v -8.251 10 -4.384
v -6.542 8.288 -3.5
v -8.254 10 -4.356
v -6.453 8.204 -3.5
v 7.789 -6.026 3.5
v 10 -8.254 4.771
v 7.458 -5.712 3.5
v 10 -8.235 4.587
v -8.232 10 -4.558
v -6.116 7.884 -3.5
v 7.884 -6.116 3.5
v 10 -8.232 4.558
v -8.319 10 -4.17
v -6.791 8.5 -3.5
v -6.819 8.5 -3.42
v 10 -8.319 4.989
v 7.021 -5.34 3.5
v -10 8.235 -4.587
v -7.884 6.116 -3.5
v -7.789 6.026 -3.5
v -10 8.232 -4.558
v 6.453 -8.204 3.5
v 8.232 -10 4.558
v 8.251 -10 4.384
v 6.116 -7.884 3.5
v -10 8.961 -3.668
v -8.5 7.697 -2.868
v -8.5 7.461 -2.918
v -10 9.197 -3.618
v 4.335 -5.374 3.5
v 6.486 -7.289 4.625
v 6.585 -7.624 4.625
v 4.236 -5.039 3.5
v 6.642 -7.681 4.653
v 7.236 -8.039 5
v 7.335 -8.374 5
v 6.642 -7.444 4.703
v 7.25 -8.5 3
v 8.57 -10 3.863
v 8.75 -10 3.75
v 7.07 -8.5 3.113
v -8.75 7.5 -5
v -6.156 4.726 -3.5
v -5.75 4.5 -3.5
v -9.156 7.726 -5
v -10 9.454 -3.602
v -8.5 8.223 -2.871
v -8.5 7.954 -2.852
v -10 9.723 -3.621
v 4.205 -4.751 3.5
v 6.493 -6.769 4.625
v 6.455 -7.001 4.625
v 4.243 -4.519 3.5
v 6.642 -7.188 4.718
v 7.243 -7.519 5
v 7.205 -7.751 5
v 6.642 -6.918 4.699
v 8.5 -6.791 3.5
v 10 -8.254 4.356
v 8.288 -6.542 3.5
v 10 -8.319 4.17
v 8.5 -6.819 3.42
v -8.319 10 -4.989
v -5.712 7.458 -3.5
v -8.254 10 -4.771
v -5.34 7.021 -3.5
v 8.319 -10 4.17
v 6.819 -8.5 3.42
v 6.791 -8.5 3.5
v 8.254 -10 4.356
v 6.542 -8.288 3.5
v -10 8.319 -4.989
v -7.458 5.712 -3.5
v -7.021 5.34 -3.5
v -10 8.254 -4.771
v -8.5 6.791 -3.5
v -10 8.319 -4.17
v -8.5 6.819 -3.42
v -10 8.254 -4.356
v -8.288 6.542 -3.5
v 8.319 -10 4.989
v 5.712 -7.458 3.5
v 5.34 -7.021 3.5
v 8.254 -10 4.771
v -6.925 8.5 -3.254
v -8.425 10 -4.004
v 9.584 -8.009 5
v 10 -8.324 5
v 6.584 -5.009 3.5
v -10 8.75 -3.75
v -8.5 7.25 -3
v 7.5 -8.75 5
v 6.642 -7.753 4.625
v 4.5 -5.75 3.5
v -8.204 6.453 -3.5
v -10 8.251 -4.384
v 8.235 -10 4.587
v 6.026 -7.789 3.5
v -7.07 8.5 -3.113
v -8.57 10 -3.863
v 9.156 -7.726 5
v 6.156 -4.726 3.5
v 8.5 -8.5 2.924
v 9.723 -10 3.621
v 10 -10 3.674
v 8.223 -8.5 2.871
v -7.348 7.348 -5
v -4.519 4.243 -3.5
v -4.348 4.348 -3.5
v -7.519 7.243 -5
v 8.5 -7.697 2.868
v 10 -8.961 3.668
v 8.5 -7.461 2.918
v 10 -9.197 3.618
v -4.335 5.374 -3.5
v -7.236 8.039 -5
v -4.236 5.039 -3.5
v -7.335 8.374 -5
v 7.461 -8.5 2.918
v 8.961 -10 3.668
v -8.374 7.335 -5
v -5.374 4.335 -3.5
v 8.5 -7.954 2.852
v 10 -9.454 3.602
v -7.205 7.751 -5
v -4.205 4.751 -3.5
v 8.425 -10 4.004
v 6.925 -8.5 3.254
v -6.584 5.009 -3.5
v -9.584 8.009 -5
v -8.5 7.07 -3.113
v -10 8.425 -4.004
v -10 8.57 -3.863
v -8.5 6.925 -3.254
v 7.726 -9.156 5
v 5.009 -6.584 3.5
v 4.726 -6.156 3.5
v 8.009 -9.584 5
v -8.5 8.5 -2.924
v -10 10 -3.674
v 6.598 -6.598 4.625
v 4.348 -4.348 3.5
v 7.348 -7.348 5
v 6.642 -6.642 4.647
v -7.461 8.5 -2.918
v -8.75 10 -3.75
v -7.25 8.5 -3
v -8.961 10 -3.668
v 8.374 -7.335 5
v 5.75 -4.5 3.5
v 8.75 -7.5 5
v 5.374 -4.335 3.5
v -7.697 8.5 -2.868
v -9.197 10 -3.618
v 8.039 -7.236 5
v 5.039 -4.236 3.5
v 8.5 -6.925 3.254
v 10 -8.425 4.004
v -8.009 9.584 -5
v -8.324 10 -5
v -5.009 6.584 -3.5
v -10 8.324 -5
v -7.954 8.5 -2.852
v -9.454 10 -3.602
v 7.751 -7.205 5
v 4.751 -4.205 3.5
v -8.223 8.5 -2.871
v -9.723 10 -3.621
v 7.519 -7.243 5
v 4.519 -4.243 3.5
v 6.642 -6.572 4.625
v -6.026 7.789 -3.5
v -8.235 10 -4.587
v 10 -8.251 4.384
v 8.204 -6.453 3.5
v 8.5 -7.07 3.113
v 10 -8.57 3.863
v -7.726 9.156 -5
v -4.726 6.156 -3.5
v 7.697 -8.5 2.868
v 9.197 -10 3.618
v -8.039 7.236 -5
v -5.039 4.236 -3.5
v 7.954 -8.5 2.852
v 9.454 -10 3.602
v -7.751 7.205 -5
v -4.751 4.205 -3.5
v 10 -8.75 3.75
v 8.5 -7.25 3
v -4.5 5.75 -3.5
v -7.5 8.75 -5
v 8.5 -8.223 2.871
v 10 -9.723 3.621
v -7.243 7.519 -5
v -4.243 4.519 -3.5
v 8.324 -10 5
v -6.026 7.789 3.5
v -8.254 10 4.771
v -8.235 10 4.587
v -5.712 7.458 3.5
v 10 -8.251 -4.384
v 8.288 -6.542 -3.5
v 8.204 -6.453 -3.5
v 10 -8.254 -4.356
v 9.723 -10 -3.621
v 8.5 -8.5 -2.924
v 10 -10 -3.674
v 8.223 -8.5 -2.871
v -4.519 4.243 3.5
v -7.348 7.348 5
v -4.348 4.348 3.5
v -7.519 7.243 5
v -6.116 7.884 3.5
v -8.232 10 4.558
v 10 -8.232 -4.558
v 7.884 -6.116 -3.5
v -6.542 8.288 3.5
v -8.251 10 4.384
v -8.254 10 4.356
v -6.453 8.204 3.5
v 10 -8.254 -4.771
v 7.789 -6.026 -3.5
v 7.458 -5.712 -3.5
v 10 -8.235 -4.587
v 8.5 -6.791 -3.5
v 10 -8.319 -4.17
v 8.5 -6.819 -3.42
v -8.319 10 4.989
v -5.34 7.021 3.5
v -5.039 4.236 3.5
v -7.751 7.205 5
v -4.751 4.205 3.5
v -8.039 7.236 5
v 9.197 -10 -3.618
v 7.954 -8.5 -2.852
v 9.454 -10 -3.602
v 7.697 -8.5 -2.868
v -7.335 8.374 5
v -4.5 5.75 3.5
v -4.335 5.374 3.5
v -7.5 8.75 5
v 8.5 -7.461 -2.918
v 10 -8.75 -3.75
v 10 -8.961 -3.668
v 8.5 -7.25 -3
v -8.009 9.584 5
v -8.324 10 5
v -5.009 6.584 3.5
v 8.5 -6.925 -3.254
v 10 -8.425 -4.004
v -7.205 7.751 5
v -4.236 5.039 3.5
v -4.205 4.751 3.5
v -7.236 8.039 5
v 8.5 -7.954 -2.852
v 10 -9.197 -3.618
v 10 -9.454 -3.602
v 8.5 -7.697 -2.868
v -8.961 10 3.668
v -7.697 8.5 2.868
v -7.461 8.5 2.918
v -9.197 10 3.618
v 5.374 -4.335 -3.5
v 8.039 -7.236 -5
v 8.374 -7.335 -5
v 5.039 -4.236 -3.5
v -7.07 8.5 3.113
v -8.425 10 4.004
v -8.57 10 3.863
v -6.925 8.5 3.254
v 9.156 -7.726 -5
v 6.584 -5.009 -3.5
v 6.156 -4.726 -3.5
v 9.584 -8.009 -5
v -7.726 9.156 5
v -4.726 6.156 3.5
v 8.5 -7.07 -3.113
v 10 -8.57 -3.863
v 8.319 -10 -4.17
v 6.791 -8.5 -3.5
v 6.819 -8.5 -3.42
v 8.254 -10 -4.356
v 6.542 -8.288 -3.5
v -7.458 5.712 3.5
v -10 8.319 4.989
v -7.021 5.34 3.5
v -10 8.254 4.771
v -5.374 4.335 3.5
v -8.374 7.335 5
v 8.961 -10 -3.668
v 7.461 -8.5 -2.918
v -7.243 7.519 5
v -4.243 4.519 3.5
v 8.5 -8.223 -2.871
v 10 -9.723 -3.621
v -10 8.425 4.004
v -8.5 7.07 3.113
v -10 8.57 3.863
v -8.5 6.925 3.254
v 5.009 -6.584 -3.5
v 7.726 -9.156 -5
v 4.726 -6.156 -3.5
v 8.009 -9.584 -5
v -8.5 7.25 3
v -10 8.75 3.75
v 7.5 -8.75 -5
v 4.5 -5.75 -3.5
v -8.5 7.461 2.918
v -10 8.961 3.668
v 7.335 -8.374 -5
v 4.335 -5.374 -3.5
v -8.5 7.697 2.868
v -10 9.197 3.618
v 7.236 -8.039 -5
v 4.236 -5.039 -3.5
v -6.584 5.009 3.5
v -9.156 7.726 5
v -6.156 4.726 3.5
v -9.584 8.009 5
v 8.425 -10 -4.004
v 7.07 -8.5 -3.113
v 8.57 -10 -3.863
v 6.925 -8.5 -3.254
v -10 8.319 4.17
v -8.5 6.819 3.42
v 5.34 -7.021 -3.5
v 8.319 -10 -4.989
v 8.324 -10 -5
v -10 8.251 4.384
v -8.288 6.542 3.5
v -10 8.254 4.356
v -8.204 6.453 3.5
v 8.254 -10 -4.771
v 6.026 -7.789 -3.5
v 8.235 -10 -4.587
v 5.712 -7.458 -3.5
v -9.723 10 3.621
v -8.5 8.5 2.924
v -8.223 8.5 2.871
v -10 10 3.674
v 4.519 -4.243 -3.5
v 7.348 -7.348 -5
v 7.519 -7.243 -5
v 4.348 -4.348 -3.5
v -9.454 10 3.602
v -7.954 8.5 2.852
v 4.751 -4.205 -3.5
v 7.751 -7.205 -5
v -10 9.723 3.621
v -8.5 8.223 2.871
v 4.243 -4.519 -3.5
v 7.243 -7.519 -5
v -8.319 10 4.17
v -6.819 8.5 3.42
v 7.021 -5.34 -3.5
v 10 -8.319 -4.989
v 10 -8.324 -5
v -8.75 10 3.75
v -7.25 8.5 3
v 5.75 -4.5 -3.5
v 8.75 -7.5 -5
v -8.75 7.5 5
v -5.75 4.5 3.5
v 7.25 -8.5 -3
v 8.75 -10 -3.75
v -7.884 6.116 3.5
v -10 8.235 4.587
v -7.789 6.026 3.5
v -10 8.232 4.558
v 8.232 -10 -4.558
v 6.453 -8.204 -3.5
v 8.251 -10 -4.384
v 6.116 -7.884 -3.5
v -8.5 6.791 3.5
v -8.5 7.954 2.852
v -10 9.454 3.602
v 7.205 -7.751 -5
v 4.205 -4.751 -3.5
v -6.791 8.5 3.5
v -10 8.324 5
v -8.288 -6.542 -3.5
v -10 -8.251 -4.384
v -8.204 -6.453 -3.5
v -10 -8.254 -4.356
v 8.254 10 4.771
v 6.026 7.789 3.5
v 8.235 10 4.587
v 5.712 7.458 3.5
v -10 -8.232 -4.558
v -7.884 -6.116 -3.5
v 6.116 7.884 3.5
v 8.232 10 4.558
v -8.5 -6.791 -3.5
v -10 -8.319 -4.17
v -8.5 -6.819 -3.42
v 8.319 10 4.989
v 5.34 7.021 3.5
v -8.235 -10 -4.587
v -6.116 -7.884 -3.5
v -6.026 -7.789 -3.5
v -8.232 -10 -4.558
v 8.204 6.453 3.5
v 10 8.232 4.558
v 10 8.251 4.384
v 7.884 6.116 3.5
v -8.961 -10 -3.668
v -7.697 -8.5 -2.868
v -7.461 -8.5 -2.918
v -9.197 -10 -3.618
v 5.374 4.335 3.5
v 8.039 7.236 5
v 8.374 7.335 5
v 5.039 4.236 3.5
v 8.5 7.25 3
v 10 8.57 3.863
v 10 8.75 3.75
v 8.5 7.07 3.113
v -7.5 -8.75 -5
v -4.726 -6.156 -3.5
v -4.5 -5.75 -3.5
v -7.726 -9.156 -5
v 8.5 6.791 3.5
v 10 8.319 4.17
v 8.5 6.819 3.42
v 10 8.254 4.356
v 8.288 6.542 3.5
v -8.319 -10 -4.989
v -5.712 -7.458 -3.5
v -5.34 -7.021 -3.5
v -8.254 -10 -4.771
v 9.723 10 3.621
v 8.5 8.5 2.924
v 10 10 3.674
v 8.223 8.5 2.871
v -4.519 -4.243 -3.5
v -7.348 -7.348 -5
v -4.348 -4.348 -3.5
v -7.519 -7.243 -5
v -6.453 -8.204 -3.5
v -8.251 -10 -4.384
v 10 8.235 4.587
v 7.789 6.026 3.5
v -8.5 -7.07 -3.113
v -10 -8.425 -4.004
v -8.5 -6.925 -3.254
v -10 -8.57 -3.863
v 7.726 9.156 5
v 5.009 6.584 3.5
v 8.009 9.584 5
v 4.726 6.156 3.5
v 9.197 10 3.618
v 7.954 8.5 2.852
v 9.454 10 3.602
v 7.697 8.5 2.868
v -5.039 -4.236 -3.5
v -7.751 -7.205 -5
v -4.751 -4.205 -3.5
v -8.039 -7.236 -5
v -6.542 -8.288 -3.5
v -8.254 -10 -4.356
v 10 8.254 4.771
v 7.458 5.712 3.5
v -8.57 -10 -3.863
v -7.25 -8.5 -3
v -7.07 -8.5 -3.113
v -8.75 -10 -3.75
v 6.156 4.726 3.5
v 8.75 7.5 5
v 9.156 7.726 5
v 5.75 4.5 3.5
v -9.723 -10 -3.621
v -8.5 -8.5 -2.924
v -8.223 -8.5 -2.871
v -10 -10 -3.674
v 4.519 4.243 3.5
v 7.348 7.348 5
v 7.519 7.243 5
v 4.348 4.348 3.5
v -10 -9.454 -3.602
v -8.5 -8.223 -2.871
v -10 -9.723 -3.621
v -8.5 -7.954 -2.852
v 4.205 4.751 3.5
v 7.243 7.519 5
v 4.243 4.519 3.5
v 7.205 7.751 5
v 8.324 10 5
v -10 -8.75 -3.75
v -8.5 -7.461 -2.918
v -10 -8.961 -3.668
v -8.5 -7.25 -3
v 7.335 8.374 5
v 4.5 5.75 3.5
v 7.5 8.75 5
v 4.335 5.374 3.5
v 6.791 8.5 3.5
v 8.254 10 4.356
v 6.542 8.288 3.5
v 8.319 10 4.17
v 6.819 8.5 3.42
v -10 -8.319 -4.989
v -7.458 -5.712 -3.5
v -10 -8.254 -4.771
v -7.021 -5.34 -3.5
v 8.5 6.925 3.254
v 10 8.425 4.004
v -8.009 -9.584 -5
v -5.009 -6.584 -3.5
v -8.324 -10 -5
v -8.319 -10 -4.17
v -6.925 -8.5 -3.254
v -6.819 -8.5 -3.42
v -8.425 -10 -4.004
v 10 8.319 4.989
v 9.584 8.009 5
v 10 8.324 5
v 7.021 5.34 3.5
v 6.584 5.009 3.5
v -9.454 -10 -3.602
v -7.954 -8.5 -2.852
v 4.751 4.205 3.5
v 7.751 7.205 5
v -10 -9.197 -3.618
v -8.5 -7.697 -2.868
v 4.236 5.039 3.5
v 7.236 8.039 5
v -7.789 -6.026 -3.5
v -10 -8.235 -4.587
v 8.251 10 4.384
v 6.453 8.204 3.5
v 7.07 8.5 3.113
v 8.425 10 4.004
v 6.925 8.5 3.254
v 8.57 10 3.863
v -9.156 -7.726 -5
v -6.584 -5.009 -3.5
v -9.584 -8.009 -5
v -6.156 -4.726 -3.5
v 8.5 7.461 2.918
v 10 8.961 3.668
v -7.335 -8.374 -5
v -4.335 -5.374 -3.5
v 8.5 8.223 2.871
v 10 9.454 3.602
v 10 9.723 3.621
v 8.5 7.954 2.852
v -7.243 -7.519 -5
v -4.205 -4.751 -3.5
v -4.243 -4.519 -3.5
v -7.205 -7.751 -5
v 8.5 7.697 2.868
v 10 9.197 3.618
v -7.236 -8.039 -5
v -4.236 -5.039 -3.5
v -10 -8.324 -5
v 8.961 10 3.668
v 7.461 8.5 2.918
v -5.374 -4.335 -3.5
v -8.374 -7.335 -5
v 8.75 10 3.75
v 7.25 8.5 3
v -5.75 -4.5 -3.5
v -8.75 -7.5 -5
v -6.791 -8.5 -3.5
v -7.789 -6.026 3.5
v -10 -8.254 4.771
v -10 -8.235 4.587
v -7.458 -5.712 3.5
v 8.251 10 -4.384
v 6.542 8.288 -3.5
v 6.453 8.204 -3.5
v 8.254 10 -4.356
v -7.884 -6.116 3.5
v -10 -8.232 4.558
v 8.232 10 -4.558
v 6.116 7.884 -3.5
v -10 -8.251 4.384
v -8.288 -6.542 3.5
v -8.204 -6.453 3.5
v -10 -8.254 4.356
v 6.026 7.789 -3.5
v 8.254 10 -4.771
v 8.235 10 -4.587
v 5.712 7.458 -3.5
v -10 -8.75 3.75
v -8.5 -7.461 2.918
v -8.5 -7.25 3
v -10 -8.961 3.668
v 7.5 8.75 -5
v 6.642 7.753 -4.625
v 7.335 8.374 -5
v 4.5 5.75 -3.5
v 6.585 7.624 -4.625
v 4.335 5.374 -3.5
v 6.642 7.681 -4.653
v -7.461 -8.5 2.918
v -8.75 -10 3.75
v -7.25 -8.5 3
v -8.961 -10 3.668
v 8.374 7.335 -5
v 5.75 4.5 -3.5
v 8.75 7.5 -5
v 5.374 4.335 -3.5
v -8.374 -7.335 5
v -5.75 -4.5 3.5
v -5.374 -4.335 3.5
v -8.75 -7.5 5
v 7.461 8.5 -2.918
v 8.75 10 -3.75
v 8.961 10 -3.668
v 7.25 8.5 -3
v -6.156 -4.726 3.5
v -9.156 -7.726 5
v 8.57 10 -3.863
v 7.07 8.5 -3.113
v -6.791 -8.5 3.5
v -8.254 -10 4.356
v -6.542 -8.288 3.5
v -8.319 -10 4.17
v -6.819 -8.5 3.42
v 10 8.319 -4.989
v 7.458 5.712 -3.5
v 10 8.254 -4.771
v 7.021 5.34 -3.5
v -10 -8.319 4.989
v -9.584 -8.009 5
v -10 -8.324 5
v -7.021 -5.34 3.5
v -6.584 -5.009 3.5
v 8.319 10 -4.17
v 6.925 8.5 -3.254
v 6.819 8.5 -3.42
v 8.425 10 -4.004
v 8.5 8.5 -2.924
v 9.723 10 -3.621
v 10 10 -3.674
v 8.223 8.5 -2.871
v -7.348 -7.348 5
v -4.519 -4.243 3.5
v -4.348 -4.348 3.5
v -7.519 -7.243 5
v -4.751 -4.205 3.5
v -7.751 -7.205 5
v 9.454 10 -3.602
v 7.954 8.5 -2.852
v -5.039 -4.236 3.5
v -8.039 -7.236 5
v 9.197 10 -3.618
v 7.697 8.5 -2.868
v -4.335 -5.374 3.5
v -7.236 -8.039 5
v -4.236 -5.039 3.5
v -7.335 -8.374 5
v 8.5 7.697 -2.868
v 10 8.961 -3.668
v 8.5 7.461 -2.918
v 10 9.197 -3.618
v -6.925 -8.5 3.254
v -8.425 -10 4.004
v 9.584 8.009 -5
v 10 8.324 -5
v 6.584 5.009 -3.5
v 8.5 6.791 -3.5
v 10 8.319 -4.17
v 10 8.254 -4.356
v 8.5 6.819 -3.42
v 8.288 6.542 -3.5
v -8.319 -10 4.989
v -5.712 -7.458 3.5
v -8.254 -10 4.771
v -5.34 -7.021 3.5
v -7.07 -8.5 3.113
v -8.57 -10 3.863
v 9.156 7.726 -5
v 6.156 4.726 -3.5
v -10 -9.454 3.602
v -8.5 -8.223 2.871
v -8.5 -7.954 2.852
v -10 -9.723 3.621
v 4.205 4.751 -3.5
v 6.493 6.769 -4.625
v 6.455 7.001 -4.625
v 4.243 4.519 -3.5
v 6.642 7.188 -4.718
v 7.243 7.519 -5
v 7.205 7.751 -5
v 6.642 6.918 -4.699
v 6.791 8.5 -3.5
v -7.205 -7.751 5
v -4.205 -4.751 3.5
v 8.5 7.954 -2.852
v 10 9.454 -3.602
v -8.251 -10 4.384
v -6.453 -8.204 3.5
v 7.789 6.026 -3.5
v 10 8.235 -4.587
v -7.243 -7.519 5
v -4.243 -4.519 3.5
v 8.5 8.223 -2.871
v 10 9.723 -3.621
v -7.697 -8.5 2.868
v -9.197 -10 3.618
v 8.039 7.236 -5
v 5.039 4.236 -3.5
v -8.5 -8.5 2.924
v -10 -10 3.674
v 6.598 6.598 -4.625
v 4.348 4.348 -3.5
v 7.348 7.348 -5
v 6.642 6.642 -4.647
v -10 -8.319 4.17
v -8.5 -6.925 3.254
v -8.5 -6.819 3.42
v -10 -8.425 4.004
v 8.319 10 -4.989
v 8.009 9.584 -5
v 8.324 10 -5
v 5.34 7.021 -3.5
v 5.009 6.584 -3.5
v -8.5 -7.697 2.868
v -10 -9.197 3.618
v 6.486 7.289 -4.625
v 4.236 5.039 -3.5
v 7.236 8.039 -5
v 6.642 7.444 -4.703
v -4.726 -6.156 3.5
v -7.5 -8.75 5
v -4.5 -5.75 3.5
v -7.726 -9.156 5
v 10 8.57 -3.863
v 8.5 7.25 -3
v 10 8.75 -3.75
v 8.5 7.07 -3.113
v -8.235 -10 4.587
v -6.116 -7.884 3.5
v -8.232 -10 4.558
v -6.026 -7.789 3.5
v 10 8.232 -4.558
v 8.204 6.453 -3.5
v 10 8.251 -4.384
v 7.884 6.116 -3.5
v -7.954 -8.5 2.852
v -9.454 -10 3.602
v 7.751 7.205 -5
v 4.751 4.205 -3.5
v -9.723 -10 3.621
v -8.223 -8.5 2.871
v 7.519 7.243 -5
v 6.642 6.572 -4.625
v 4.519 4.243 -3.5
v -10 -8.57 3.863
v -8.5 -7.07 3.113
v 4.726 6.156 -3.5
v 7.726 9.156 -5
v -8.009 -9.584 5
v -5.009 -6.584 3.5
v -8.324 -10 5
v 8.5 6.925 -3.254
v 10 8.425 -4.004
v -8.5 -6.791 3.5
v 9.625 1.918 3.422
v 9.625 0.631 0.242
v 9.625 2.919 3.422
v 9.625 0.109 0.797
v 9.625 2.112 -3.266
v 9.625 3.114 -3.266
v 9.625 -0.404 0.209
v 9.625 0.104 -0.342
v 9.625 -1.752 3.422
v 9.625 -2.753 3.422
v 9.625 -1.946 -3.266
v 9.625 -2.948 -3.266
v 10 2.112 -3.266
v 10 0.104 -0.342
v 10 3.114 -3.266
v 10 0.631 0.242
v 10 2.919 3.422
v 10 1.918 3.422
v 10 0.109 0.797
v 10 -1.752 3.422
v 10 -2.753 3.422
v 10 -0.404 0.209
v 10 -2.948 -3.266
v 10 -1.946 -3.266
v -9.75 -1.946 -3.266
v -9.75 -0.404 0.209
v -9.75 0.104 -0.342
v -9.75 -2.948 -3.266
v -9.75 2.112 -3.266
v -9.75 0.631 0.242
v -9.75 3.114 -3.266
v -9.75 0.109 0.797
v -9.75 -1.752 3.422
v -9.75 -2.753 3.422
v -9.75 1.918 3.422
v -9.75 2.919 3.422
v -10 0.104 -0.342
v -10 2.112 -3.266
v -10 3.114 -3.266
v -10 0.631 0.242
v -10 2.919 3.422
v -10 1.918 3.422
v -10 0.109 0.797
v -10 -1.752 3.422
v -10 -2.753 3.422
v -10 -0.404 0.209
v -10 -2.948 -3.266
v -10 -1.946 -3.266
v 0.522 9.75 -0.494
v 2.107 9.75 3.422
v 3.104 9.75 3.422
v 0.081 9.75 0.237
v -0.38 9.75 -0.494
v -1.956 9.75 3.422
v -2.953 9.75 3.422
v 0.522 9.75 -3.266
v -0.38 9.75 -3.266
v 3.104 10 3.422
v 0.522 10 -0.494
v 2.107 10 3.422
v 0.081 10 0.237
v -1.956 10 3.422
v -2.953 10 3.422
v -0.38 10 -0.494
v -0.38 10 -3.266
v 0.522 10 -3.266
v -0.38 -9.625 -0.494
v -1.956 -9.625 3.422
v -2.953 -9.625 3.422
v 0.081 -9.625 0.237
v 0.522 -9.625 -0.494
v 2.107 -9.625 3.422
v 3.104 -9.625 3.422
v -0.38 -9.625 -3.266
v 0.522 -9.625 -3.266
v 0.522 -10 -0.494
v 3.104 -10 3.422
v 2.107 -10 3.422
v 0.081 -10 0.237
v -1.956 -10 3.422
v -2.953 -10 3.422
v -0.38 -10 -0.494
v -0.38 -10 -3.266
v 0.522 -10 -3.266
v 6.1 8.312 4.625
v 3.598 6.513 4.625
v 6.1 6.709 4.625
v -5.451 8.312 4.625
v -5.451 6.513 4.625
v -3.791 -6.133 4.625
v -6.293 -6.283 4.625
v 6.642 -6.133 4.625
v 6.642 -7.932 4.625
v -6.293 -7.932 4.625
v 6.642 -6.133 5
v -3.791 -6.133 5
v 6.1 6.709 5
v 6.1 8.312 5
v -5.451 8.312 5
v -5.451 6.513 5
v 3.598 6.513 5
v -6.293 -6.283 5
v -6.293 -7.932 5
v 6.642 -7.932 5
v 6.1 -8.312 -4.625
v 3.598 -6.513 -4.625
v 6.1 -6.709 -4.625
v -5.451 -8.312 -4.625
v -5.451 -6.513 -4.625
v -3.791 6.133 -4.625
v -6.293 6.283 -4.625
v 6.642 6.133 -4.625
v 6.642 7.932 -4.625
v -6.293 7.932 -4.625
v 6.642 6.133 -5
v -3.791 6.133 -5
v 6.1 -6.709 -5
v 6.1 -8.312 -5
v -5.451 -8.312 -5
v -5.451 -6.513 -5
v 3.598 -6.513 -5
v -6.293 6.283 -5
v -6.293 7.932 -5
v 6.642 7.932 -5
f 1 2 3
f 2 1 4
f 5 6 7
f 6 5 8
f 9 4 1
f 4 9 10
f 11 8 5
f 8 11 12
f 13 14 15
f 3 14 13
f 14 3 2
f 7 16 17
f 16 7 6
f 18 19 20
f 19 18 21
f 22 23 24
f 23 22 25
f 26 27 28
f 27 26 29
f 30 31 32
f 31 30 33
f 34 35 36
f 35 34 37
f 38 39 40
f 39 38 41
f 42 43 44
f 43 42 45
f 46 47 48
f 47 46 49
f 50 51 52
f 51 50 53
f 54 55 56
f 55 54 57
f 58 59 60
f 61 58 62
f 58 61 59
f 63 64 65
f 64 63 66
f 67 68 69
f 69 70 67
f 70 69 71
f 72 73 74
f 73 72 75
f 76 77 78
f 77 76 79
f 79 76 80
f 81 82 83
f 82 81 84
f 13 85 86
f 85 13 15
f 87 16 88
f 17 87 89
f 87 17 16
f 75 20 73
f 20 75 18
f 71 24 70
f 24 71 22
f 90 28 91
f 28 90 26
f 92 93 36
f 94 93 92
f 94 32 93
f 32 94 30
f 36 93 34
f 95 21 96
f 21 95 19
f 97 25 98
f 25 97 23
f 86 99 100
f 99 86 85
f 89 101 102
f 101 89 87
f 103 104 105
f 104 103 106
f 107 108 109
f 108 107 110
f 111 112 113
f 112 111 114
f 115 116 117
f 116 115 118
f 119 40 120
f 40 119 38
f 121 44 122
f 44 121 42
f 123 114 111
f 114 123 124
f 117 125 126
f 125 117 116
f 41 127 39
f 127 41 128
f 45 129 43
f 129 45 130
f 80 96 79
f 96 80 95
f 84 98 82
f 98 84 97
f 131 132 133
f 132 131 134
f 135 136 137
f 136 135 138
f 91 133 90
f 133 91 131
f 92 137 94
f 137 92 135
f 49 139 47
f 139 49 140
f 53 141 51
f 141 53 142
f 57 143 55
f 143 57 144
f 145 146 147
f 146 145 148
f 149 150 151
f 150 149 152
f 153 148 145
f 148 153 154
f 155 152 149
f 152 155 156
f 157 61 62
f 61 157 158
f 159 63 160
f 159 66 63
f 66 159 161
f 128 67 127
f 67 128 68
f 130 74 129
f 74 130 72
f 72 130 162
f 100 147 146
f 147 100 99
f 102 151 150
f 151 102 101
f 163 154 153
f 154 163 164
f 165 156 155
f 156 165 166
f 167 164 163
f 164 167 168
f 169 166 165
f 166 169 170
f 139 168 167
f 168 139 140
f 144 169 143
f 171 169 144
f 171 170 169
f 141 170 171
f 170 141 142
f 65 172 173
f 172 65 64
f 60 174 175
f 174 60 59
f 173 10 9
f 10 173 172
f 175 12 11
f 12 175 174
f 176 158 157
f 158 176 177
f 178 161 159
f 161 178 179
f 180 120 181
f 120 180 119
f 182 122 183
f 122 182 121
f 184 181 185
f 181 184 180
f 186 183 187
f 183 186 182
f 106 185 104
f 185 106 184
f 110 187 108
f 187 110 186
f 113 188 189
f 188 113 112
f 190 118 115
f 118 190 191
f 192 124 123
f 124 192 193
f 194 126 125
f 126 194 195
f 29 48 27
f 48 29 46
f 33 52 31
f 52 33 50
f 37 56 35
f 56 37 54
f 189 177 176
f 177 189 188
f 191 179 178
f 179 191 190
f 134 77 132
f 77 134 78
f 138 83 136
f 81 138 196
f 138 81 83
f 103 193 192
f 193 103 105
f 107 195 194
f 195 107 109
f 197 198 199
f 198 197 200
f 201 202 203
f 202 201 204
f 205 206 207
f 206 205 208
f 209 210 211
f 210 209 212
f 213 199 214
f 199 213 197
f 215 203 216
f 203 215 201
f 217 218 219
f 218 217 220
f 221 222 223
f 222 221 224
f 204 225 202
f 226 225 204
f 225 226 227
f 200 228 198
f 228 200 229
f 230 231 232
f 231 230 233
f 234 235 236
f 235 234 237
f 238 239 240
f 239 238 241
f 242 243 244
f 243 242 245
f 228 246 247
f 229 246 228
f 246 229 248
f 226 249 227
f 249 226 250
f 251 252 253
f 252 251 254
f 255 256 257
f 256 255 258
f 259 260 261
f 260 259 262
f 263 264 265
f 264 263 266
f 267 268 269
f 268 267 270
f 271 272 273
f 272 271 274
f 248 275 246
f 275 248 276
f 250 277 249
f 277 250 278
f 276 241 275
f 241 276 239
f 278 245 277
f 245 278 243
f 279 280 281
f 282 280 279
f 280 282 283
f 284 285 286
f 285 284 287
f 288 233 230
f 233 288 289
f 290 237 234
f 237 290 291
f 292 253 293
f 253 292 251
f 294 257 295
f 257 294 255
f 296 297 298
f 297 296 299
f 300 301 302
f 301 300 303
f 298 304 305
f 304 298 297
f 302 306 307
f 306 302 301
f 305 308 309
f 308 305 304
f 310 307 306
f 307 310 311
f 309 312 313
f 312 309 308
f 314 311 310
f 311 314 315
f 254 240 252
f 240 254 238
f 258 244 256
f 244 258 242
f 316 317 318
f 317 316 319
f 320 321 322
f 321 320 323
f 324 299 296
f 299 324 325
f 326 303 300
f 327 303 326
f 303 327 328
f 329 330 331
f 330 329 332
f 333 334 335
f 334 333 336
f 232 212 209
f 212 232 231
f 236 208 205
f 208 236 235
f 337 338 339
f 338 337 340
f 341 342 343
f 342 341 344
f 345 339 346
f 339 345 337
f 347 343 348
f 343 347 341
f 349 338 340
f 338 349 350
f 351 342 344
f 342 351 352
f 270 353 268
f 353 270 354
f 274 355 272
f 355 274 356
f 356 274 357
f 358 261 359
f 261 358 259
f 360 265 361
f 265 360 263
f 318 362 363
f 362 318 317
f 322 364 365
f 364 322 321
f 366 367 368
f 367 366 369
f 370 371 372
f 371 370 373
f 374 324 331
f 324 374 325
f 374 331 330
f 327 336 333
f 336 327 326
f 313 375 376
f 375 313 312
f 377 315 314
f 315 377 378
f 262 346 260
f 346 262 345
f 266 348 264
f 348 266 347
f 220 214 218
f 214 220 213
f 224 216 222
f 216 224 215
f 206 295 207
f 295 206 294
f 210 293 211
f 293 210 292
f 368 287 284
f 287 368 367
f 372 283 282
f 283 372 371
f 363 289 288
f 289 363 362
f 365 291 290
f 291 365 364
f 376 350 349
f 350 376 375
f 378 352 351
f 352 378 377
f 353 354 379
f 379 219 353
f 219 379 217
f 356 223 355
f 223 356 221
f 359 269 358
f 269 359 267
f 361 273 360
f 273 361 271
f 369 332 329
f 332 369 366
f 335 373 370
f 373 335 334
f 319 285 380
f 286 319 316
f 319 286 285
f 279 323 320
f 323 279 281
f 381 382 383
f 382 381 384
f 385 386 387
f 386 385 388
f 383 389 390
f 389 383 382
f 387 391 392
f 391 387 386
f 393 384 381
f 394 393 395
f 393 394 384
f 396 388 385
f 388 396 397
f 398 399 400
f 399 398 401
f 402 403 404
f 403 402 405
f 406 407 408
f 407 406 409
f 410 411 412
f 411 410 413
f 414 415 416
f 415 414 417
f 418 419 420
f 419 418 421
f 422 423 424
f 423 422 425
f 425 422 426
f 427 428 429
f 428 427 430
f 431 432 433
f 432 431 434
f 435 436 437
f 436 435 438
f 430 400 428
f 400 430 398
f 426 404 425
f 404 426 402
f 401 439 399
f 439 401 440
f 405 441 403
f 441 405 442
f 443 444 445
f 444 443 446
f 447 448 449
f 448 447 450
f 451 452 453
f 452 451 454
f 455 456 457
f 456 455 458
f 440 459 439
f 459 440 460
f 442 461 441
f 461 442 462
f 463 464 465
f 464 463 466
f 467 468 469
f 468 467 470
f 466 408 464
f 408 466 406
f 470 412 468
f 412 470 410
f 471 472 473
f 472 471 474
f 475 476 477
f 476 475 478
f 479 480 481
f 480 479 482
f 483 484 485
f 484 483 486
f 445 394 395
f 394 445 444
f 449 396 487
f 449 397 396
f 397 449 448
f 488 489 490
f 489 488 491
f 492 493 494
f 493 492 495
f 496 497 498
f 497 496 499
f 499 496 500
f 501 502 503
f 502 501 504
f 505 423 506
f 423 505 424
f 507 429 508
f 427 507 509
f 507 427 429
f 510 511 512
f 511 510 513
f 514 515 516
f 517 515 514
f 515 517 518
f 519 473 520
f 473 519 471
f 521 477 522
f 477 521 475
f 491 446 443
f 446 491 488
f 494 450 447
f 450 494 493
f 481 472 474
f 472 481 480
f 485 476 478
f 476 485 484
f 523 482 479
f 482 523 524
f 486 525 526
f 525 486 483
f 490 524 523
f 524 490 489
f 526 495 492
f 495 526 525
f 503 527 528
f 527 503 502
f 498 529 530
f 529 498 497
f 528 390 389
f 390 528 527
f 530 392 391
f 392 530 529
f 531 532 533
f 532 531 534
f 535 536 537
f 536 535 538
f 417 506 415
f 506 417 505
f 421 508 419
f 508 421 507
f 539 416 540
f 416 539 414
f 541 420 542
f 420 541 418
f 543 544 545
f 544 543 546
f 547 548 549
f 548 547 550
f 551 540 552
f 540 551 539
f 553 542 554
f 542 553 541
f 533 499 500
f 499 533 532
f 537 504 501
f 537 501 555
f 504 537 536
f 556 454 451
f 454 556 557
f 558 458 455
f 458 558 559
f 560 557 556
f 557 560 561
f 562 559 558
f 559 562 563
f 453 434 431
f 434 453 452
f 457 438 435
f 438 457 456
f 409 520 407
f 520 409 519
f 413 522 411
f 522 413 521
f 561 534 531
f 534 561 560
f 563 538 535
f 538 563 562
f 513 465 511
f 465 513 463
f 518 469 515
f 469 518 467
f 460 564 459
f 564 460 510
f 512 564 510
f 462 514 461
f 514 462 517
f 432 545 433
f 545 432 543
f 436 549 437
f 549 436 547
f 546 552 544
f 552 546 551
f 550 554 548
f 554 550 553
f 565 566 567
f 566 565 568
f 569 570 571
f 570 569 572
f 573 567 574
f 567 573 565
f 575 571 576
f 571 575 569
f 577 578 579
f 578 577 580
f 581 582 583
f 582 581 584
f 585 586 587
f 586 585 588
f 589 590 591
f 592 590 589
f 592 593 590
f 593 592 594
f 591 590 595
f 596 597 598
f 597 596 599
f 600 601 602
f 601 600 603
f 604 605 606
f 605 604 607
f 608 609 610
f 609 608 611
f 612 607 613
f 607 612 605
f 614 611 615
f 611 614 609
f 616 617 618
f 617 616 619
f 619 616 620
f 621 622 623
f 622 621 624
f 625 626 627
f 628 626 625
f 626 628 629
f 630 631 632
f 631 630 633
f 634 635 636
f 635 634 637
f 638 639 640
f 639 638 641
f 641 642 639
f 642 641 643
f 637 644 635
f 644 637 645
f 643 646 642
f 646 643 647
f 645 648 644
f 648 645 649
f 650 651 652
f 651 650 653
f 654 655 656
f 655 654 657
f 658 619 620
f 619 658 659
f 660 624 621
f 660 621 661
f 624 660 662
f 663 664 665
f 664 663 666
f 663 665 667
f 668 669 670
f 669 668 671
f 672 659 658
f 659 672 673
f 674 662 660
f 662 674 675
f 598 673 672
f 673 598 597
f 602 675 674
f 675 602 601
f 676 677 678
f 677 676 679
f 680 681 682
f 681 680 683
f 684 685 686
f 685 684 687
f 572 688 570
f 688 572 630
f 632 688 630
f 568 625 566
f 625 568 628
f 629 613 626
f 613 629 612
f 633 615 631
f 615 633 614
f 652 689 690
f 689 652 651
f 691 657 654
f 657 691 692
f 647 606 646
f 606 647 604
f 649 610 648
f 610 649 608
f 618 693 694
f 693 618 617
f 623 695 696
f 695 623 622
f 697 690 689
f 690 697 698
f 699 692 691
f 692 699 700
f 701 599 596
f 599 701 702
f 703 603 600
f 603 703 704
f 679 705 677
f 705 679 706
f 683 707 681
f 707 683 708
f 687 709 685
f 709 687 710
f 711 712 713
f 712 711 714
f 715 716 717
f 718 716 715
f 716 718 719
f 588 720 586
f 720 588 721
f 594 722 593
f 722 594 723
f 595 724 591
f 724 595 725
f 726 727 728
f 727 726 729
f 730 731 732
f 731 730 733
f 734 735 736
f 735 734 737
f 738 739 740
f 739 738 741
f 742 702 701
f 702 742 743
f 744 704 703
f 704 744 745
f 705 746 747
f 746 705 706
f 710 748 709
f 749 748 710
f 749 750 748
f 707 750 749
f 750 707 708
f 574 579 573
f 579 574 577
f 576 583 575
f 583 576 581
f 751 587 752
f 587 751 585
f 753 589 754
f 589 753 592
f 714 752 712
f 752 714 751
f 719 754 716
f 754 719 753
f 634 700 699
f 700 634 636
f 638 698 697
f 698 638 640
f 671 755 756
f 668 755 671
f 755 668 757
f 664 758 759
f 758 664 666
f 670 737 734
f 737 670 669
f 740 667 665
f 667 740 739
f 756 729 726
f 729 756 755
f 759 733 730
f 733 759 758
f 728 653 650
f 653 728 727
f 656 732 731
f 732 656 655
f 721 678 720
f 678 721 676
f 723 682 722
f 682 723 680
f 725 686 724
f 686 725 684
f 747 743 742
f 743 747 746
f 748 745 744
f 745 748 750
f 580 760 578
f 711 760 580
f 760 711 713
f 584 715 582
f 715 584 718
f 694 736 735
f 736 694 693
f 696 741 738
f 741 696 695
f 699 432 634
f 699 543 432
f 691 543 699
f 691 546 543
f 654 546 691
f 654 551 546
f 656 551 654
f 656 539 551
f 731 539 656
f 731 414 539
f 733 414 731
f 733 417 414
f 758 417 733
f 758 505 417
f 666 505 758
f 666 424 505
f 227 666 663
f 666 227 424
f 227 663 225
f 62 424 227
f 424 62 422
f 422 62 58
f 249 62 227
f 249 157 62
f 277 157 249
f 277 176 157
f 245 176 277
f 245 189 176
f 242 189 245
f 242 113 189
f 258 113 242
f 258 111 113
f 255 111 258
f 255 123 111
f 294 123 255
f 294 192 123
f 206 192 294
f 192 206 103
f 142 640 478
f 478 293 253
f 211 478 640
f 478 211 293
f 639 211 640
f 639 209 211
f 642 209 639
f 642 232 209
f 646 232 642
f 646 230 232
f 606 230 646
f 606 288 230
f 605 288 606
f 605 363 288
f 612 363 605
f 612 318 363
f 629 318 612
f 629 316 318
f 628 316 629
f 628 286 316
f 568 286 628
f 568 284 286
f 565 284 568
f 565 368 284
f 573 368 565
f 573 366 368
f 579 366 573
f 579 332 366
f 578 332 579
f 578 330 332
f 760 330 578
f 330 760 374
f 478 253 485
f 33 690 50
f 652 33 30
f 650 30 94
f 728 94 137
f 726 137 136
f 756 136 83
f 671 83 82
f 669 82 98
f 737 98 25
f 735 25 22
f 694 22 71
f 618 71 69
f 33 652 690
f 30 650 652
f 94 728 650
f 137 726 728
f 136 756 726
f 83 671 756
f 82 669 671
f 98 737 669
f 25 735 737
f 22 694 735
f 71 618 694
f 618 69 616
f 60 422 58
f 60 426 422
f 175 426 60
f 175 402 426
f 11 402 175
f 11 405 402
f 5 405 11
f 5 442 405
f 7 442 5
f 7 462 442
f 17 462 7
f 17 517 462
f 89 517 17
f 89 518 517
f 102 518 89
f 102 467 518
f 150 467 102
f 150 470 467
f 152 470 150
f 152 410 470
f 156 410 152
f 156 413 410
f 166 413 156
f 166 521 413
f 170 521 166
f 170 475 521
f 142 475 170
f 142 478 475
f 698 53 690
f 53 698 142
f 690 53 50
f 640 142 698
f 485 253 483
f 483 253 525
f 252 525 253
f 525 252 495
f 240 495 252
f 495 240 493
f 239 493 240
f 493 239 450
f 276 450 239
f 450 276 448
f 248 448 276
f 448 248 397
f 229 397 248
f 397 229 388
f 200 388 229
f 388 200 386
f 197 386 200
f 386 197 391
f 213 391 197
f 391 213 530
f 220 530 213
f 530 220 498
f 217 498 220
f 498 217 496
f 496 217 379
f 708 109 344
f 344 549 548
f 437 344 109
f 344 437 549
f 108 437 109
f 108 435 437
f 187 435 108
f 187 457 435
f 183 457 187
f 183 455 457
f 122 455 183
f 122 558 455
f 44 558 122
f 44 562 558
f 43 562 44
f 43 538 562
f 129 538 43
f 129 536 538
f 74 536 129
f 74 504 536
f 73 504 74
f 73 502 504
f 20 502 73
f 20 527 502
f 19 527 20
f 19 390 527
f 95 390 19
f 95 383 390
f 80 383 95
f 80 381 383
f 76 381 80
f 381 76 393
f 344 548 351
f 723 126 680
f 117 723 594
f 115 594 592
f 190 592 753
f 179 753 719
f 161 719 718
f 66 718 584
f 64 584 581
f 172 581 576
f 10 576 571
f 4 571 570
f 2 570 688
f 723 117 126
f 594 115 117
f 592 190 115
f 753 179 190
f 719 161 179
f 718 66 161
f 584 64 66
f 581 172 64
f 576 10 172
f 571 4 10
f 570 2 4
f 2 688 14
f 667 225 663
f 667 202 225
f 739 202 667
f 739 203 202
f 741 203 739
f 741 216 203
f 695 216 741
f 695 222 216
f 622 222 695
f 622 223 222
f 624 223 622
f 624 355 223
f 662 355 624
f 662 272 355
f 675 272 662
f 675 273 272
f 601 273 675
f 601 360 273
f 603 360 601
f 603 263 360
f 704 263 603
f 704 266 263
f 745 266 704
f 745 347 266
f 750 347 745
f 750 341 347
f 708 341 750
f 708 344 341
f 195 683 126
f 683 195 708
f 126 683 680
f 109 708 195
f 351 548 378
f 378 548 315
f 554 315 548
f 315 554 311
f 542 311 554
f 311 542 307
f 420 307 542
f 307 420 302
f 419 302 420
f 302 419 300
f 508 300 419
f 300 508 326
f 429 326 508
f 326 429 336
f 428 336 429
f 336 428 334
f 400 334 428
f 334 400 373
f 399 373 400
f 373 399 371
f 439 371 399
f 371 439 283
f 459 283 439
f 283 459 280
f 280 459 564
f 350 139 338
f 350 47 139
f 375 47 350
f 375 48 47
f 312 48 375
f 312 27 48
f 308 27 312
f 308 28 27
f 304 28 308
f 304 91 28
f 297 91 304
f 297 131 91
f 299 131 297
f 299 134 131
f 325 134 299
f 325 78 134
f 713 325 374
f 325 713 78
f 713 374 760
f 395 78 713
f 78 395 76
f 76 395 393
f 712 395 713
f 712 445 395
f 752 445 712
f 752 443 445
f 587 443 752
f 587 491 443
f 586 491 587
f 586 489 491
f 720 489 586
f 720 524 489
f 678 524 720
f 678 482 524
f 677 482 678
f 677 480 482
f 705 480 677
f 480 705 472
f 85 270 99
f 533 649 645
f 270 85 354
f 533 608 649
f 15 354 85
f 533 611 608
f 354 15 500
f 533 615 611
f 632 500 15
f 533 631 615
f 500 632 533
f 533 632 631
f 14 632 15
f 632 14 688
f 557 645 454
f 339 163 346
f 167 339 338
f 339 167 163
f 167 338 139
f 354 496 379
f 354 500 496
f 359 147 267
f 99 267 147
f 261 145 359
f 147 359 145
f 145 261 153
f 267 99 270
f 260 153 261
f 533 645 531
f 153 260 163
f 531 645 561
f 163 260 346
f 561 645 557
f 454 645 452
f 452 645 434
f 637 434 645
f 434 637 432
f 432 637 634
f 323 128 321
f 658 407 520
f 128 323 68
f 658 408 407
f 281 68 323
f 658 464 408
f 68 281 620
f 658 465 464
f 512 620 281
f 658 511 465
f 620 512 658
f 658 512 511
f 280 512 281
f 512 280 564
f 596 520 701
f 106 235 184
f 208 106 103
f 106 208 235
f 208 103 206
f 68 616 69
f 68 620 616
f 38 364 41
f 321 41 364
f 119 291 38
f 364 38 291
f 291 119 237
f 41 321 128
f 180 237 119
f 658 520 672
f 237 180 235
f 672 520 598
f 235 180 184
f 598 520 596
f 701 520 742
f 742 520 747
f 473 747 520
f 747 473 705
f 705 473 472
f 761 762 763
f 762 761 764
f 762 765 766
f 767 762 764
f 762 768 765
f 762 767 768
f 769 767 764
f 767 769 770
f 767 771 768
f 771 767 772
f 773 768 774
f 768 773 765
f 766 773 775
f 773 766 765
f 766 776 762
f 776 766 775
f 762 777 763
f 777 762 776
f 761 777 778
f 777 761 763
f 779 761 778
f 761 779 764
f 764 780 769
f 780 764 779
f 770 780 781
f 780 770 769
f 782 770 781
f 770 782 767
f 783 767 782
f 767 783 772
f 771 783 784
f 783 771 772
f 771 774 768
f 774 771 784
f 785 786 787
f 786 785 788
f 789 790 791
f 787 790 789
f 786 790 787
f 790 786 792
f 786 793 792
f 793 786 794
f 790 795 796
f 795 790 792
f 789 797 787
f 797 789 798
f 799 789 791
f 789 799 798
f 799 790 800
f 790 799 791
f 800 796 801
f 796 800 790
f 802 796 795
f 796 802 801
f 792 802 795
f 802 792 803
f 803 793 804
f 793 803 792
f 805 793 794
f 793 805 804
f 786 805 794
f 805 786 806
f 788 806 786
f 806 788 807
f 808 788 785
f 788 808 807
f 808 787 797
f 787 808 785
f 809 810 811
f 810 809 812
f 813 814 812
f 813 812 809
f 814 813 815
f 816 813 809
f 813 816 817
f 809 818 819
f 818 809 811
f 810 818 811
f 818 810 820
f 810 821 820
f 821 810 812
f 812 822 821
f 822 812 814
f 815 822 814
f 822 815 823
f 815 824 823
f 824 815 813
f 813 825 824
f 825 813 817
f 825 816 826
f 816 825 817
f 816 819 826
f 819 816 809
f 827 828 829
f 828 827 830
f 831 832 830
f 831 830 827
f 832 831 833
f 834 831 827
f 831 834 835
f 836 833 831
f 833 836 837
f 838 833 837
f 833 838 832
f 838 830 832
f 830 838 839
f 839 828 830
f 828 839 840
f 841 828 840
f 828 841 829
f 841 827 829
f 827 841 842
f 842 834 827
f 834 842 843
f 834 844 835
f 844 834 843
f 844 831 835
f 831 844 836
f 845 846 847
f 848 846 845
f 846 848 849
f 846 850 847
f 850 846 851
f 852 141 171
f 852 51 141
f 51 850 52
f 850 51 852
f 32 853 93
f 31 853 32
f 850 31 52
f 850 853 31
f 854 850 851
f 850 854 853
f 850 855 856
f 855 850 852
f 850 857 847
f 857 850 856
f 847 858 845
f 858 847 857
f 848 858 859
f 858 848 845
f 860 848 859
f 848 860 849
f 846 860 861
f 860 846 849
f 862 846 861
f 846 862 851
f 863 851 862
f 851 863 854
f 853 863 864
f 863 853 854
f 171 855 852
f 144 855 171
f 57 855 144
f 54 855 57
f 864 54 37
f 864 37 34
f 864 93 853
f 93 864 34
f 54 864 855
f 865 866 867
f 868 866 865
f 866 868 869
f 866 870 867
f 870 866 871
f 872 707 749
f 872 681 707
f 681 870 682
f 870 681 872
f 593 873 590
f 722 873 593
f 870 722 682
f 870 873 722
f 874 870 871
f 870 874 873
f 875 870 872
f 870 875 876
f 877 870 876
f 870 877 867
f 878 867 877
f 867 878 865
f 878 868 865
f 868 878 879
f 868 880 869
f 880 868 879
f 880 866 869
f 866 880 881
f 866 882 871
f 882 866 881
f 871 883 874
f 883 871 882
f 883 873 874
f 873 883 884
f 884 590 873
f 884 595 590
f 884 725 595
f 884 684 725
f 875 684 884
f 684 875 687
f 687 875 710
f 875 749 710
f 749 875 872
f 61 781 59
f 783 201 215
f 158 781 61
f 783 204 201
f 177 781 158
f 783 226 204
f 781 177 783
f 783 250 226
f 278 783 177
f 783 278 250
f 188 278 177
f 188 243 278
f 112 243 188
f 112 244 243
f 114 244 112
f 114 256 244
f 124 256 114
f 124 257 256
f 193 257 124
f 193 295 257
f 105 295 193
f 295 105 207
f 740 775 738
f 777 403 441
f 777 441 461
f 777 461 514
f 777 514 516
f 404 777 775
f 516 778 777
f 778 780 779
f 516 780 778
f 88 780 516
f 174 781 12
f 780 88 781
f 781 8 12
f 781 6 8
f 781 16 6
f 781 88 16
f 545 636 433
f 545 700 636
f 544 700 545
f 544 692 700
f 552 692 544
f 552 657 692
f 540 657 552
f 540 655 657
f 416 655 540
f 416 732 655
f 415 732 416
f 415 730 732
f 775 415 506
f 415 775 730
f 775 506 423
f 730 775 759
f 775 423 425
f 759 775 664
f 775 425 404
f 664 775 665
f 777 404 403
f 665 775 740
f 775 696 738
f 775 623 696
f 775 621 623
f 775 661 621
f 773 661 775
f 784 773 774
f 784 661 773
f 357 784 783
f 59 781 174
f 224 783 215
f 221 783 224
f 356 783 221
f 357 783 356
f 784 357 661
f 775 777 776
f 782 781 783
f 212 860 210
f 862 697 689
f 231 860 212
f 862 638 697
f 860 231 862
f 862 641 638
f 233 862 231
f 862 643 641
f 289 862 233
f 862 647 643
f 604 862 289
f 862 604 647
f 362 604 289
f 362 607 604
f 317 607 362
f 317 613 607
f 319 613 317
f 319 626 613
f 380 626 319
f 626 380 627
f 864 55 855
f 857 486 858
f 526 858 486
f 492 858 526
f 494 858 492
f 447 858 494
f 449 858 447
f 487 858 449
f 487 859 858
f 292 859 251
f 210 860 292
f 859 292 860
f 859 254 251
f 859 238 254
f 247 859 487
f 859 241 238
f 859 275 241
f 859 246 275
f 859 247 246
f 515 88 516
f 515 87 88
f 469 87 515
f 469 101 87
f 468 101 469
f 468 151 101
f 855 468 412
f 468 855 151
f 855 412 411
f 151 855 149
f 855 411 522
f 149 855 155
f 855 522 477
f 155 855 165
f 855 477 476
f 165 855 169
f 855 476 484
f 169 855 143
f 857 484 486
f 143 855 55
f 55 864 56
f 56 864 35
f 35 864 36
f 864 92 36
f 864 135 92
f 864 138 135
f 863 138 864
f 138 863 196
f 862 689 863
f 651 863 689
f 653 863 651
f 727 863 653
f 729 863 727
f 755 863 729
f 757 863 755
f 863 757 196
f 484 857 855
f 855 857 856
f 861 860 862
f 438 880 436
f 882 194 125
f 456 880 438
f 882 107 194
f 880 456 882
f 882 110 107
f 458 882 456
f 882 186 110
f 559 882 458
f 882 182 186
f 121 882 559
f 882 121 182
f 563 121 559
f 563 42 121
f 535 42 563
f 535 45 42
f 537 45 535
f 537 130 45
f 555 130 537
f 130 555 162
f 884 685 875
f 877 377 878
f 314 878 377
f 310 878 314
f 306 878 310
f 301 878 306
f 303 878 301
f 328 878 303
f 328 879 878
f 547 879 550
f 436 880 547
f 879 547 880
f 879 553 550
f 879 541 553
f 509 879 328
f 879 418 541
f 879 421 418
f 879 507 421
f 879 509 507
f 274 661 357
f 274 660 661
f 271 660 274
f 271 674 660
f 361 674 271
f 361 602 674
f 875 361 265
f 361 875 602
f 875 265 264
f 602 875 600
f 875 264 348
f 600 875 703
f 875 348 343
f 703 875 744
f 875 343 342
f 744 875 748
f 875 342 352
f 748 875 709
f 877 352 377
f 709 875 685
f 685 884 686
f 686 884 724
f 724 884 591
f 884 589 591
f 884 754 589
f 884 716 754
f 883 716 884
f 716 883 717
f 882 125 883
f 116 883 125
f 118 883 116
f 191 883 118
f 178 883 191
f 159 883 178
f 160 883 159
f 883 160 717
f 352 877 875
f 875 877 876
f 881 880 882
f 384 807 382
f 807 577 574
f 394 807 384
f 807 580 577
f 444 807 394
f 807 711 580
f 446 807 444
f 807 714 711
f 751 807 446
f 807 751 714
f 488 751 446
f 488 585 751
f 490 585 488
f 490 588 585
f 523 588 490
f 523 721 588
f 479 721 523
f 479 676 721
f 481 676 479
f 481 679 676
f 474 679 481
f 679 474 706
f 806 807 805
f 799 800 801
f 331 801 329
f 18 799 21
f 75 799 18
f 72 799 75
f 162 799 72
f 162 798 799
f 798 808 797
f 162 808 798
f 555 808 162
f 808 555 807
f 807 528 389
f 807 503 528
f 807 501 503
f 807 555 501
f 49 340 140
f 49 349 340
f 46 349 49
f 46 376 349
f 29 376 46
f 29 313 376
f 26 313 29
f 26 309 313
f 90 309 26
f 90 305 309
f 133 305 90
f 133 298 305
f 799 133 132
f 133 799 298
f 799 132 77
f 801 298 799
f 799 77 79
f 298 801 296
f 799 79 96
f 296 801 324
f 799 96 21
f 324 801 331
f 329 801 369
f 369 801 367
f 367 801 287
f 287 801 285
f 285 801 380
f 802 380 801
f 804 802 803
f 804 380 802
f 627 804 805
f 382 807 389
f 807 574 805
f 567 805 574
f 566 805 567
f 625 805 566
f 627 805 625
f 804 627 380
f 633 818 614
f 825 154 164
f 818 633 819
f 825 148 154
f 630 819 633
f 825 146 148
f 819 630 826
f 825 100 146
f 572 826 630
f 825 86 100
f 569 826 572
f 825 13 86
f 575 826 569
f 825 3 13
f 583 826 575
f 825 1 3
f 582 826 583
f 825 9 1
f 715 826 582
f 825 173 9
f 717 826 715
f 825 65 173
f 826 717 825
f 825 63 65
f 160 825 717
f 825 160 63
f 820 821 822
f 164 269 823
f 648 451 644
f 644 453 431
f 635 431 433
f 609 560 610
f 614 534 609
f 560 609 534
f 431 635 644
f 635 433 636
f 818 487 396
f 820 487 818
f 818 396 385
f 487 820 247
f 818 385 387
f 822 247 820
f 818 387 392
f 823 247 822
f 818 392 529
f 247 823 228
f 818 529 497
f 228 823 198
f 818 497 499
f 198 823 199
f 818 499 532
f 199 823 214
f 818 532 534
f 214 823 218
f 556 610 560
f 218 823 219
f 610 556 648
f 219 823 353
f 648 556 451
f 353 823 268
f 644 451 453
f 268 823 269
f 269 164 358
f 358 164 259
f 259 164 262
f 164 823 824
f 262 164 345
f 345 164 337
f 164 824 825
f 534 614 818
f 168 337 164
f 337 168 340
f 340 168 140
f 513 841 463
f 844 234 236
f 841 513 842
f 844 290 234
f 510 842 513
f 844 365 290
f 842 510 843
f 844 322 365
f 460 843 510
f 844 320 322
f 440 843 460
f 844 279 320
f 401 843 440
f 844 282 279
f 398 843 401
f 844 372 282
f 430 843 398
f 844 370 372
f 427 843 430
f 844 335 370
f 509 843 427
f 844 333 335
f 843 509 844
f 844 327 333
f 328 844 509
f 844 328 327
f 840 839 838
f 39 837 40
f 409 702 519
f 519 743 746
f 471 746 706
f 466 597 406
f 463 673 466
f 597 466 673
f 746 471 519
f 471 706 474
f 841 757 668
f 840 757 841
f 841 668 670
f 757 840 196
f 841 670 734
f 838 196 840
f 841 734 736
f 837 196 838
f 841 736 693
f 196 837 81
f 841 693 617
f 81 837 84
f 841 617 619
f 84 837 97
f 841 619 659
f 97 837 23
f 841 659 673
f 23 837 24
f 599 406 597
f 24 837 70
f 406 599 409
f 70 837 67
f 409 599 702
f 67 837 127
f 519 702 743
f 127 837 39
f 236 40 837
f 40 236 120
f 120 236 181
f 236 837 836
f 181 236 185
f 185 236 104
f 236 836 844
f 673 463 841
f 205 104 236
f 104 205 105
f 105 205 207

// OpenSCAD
// 3D Calibration box with drain holes for SLA
 
// Length of box (X), in mm
Length = 20;   // [5:1:500]

// Depth of box (Y), in mm
Depth = 20;   // [5:1:500]

// Height of box (Z), in mm
Height = 10;   // [5:1:500]

// Should the box be hollow, boolean
hollow = 1; //   // [0:false, 1:true]

// Wall thickness, in mm
wallThickness = 1.5;    // [0.1:0.1:10.0]

// Should drain holes be included, boolean
drains = 1; //   // [0:false, 1:true]

// Corner drain diameter, in mm
drainDiameter = 2.5;    // [0.2:0.1:10.0]

// Corner drain quality
drainQuality = 40;  // [20:1:200]

// Include axis labels, boolean
labels = 1; //   // [0:false, 1:true]

// Indention of text, percentage
textIndentPercent = 25; // [1:90]


module calibrationBox()
{
    cornerDist3 = sqrt( (Length*Length)/4 + (Depth*Depth)/4 + (Height*Height)/4 );
 //   cornerDist2 = sqrt( (Length*Length)/4 + (Depth*Depth)/4 );
    cornerAngleXY = atan2(Depth,Length);
    cornerAngleX = asin( Height / (2*cornerDist3) );
    cornerLength = cornerDist3 * 2.5;
    cornerRadius = drainDiameter/2;
    
    difference()
        {
        cube( [Length,Depth,Height], center=true );
        
        if (hollow == 1)
            {
            // inner hollow
            cube( [Length-2*wallThickness,Depth-2*wallThickness,Height-2*wallThickness], center=true );

            if (drains == 1)
                {
                // corner drains
                rotate([90-cornerAngleX,0,90-cornerAngleXY])
                    cylinder( cornerLength, cornerRadius, cornerRadius, center=true, $fn=drainQuality );
                rotate([90+cornerAngleX,0,90-cornerAngleXY])
                    cylinder( cornerLength, cornerRadius, cornerRadius, center=true, $fn=drainQuality );
                rotate([90-cornerAngleX,0,90+cornerAngleXY])
                    cylinder( cornerLength, cornerRadius, cornerRadius, center=true, $fn=drainQuality );
                rotate([90+cornerAngleX,0,90+cornerAngleXY])
                    cylinder( cornerLength, cornerRadius, cornerRadius, center=true, $fn=drainQuality );
                
                }   // end drains
                
            }   // end hollow

        if (labels == 1)
            {
            // axis labels
            tX = min( Length, Height ) - 2*wallThickness;
            tY = min( Depth,  Height ) - 2*wallThickness;
            tZ = min( Length, Depth  ) - 2*wallThickness;
            
            tIndent = wallThickness * textIndentPercent / 100;
            
           translate([Length/2 - tIndent,0,0])
              rotate([90,0,90])
                linear_extrude(tIndent+1)
                  text("X", size=tX,
                       halign="center", valign="center");
            
           translate([-Length/2 - wallThickness + tIndent,0,0])
              rotate([90,0,90])
                linear_extrude(tIndent+1)
                  text("X", size=tX,
                       halign="center", valign="center");
            
           translate([0,Depth/2 + wallThickness - tIndent,0])
              rotate([90,0,0])
                linear_extrude(tIndent+1)
                  text("Y", size=tY,
                       halign="center", valign="center");
            
           translate([0,-Depth/2 + tIndent,0])
              rotate([90,0,0])
                linear_extrude(tIndent+1)
                  text("Y", size=tY,
                       halign="center", valign="center");
            
           translate([0,0,Height/2 - tIndent])
              rotate([0,0,0])
                linear_extrude(tIndent+1)
                  text("Z", size=tZ,
                       halign="center", valign="center");
            
           translate([0,0,-Height/2 + tIndent ])
              rotate([180,0,0])
                linear_extrude(tIndent+1)
                  text("Z", size=tZ,
                       halign="center", valign="center");
           }    // end labels
            
        }   // end difference

}   // end calibrationBox

calibrationBox();
